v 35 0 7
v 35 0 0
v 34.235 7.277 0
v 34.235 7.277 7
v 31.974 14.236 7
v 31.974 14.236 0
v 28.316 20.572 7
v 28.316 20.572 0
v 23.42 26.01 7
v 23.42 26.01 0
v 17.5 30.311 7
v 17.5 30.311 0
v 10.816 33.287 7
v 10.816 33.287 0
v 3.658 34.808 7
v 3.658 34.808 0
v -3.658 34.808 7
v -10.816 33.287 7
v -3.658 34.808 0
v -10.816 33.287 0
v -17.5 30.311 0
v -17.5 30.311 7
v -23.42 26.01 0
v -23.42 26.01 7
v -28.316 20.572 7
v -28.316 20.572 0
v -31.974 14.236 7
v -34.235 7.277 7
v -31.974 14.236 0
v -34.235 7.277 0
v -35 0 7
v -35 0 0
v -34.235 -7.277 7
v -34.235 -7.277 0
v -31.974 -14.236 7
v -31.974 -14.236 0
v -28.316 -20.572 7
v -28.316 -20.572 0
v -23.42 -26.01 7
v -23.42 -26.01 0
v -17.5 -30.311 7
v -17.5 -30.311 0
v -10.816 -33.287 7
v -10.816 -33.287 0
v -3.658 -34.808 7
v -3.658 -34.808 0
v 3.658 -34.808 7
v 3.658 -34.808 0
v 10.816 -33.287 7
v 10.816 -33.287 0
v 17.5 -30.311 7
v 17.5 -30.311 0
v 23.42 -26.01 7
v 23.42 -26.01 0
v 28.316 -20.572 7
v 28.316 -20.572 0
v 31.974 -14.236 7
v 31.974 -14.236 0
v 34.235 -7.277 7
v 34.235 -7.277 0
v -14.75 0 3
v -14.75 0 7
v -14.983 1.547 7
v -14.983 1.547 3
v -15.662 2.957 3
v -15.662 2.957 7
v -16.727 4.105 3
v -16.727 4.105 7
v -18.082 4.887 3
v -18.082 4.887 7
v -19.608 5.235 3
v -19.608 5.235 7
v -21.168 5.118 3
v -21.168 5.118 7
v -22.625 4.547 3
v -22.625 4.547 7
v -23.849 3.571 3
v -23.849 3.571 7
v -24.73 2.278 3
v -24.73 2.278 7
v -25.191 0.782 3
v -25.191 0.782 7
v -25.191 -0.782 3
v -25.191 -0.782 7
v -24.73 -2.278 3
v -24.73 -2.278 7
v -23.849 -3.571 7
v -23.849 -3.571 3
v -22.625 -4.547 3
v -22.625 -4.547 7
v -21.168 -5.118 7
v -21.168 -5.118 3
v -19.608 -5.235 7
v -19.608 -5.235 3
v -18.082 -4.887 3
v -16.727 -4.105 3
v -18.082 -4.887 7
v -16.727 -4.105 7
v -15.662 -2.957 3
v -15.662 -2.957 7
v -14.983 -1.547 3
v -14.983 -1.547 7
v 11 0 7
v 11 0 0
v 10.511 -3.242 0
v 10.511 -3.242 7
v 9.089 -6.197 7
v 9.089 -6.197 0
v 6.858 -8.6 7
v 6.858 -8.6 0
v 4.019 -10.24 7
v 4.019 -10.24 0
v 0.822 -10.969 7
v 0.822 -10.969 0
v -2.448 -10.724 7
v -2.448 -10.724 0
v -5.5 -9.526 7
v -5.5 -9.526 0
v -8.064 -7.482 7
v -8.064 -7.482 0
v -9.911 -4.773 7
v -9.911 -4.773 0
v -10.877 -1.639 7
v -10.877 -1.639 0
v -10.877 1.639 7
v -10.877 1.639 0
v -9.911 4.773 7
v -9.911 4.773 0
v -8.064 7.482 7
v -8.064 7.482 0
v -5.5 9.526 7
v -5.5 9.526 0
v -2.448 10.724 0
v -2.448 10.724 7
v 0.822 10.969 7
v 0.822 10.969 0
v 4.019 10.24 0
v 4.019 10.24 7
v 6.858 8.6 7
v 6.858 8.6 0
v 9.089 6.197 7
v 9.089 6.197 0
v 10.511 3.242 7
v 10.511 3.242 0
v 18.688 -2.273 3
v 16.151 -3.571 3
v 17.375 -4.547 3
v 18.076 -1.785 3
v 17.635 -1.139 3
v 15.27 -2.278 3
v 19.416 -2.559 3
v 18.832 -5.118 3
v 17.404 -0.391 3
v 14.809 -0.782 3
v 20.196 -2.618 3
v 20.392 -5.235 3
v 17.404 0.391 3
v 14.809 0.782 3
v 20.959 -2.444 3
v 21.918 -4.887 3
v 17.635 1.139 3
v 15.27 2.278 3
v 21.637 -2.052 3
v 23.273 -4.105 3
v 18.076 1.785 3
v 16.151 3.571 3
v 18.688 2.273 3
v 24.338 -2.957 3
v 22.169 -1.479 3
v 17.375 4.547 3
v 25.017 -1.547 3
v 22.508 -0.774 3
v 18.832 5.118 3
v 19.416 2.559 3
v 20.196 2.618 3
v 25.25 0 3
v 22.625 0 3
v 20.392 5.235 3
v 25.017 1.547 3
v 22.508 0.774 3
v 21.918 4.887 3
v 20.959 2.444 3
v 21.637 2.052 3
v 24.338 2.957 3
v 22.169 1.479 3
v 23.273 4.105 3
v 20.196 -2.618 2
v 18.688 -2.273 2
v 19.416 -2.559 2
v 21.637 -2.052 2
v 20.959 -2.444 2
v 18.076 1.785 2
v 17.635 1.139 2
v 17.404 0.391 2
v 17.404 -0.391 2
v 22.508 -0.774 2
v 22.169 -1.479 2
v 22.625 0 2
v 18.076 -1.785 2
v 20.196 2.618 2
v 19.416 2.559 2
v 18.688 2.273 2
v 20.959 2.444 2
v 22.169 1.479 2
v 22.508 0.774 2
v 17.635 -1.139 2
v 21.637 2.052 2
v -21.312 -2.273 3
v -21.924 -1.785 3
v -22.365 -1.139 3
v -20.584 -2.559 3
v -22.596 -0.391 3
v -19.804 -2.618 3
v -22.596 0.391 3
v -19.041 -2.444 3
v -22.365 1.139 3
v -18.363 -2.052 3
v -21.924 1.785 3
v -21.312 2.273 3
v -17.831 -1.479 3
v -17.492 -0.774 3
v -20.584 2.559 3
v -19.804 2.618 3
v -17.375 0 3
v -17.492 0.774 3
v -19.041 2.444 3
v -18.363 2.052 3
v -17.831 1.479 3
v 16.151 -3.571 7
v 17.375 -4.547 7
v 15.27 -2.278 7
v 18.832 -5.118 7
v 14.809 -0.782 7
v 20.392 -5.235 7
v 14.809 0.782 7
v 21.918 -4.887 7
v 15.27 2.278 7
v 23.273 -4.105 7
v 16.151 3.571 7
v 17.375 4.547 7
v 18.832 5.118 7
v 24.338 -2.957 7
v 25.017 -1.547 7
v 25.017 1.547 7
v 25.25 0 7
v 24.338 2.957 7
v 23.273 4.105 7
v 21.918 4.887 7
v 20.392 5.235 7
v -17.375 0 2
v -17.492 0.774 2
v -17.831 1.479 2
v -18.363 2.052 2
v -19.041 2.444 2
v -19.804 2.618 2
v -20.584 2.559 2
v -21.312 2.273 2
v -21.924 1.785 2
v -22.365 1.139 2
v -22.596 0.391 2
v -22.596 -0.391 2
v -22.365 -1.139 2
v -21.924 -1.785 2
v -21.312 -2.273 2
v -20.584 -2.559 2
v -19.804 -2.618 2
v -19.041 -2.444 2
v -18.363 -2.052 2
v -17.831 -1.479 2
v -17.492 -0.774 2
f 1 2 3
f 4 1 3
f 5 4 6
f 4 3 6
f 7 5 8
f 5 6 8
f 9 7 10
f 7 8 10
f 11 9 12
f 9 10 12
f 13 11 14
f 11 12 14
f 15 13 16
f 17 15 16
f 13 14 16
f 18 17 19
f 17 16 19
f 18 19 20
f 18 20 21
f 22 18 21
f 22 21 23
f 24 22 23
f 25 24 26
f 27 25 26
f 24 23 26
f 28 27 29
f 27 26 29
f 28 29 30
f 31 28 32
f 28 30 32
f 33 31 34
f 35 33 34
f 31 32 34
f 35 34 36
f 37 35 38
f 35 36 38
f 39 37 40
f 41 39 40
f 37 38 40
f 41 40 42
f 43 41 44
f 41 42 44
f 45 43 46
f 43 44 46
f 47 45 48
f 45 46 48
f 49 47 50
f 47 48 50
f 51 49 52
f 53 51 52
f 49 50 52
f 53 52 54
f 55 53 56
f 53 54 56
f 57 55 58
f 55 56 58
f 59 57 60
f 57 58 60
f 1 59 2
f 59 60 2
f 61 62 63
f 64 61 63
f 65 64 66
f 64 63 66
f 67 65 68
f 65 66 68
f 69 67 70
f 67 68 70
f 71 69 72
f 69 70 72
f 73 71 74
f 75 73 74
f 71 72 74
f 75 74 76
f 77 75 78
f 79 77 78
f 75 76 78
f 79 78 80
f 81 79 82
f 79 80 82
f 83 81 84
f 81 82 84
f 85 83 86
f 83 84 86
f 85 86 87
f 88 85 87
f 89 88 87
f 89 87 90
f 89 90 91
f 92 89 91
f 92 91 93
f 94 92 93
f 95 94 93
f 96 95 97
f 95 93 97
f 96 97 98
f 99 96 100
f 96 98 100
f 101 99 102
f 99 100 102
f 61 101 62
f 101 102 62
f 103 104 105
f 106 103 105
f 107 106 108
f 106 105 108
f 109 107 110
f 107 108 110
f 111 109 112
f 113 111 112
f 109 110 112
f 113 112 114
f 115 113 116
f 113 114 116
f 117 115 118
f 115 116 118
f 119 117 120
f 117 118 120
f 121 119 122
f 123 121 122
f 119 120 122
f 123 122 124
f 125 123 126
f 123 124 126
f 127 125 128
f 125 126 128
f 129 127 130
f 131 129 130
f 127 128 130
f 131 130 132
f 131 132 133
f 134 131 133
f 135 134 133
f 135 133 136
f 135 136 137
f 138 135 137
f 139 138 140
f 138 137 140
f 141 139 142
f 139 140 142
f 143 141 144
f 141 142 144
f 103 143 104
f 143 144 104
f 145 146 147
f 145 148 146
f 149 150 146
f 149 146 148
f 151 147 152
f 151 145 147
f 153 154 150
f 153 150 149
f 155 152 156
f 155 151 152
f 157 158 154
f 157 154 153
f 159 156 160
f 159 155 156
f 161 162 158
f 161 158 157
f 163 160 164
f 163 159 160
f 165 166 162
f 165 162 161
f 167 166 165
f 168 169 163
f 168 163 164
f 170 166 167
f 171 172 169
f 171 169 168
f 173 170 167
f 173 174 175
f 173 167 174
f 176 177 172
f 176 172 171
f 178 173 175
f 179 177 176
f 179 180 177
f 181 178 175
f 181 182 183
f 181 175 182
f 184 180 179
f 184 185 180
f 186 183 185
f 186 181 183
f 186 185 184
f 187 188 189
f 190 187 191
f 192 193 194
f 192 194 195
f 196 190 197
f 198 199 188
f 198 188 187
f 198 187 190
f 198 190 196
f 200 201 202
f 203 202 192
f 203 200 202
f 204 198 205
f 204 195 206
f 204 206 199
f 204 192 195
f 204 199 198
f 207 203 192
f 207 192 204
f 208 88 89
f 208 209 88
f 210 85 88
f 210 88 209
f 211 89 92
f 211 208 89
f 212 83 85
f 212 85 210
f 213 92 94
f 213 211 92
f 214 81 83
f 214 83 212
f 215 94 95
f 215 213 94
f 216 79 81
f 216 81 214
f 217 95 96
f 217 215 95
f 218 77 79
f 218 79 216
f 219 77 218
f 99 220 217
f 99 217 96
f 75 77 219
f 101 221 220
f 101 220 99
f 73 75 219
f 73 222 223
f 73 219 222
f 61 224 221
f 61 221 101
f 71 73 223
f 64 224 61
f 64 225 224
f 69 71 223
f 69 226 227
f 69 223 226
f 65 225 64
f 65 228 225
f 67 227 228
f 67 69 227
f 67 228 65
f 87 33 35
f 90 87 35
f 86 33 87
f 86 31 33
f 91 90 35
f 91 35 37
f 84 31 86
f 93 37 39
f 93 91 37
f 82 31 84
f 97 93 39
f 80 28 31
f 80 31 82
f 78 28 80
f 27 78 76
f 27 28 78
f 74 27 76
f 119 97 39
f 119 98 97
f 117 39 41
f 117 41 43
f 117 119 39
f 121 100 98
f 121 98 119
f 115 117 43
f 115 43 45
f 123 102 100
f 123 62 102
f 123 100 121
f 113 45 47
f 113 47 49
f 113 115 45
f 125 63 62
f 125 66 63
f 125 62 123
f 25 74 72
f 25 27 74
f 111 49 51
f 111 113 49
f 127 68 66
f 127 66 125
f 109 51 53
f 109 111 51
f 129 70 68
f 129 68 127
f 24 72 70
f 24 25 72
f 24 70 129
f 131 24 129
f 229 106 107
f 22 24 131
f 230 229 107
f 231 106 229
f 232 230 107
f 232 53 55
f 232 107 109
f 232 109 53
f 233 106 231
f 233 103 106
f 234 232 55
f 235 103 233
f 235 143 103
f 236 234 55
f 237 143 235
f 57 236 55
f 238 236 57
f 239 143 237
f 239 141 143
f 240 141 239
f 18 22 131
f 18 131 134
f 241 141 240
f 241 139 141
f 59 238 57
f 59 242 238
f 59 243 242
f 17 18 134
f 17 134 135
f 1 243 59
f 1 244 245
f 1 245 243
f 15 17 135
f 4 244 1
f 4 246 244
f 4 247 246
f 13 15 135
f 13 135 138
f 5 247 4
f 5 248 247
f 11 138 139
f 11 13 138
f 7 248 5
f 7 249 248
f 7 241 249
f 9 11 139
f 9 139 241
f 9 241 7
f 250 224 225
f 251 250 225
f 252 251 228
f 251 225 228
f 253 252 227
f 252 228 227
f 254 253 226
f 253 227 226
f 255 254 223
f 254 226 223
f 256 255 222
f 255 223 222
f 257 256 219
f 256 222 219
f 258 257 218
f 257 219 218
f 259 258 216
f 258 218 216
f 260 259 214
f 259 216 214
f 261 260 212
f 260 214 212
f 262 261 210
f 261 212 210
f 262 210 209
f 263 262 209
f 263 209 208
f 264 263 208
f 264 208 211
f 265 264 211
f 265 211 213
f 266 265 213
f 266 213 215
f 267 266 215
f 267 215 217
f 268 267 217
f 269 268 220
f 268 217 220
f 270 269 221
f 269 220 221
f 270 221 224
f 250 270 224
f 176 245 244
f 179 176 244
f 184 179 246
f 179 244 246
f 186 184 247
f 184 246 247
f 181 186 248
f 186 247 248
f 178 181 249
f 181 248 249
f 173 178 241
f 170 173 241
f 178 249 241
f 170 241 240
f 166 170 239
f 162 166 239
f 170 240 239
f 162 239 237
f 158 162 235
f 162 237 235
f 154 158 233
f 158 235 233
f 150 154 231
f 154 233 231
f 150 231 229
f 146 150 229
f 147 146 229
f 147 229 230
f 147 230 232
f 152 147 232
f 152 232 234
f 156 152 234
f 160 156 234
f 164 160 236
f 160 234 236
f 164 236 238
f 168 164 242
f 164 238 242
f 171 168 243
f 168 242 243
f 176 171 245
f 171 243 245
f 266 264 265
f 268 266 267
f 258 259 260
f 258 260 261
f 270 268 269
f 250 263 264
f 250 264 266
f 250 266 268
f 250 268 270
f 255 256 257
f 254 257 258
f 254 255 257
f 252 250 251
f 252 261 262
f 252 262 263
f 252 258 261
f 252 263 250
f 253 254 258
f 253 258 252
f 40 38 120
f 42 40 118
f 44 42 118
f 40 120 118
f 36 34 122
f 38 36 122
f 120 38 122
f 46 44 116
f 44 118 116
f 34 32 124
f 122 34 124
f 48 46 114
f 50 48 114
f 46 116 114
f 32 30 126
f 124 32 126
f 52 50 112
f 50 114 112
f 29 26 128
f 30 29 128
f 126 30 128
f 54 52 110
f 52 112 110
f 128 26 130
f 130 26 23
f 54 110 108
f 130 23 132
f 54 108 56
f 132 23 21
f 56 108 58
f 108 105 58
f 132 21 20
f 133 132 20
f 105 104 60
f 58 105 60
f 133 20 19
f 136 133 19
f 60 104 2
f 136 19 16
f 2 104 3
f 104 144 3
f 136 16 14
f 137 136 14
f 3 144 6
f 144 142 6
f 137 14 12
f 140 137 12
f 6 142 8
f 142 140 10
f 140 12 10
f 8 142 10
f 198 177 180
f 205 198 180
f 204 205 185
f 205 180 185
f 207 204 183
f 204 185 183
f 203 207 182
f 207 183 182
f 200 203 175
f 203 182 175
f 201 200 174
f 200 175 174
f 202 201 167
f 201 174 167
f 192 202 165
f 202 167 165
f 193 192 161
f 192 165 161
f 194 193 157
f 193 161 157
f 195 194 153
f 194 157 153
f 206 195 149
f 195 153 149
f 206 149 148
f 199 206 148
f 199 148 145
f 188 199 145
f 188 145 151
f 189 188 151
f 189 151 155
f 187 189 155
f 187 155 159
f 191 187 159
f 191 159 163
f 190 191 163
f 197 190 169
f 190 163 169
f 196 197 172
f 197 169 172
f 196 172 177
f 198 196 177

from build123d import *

# Parameters (mm, degrees)
SKETCH_R        = 35
PAD_DEPTH       = 7
SKETCH002_R     = 11
POCKET_DEPTH    = 7
SKETCH003_R     = 5.25
POCKET001_DEPTH = 4
SKETCH004_R     = 2.625
POCKET002_DEPTH = 1


with BuildPart() as part:
    # Sketch → Pad (new body)
    with BuildSketch(Plane.XY):
        Circle(SKETCH_R)
    extrude(amount=PAD_DEPTH)

    # Sketch002 → Pocket (cut)
    with BuildSketch(Plane(origin=(0, 0, 0), x_dir=(1, 0, 0), z_dir=(0, 0, -1))):
        Circle(SKETCH002_R)
    extrude(amount=-POCKET_DEPTH, mode=Mode.SUBTRACT)

    # Sketch003 (on Face3 of Pocket) → Pocket001 (cut)
    with BuildSketch(Plane.XY.offset(7)):
        with Locations((20, 0)):
            Circle(SKETCH003_R)
        with Locations((-20, 0)):
            Circle(SKETCH003_R)
    extrude(amount=-POCKET001_DEPTH, mode=Mode.SUBTRACT)

    # Sketch004 (on Face7 of Pocket001) → Pocket002 (cut)
    with BuildSketch(Plane.XY.offset(3)):
        with Locations((-20, 0)):
            Circle(SKETCH004_R)
        with Locations((20, 0)):
            Circle(SKETCH004_R)
    extrude(amount=-POCKET002_DEPTH, mode=Mode.SUBTRACT)


solid = part.part
